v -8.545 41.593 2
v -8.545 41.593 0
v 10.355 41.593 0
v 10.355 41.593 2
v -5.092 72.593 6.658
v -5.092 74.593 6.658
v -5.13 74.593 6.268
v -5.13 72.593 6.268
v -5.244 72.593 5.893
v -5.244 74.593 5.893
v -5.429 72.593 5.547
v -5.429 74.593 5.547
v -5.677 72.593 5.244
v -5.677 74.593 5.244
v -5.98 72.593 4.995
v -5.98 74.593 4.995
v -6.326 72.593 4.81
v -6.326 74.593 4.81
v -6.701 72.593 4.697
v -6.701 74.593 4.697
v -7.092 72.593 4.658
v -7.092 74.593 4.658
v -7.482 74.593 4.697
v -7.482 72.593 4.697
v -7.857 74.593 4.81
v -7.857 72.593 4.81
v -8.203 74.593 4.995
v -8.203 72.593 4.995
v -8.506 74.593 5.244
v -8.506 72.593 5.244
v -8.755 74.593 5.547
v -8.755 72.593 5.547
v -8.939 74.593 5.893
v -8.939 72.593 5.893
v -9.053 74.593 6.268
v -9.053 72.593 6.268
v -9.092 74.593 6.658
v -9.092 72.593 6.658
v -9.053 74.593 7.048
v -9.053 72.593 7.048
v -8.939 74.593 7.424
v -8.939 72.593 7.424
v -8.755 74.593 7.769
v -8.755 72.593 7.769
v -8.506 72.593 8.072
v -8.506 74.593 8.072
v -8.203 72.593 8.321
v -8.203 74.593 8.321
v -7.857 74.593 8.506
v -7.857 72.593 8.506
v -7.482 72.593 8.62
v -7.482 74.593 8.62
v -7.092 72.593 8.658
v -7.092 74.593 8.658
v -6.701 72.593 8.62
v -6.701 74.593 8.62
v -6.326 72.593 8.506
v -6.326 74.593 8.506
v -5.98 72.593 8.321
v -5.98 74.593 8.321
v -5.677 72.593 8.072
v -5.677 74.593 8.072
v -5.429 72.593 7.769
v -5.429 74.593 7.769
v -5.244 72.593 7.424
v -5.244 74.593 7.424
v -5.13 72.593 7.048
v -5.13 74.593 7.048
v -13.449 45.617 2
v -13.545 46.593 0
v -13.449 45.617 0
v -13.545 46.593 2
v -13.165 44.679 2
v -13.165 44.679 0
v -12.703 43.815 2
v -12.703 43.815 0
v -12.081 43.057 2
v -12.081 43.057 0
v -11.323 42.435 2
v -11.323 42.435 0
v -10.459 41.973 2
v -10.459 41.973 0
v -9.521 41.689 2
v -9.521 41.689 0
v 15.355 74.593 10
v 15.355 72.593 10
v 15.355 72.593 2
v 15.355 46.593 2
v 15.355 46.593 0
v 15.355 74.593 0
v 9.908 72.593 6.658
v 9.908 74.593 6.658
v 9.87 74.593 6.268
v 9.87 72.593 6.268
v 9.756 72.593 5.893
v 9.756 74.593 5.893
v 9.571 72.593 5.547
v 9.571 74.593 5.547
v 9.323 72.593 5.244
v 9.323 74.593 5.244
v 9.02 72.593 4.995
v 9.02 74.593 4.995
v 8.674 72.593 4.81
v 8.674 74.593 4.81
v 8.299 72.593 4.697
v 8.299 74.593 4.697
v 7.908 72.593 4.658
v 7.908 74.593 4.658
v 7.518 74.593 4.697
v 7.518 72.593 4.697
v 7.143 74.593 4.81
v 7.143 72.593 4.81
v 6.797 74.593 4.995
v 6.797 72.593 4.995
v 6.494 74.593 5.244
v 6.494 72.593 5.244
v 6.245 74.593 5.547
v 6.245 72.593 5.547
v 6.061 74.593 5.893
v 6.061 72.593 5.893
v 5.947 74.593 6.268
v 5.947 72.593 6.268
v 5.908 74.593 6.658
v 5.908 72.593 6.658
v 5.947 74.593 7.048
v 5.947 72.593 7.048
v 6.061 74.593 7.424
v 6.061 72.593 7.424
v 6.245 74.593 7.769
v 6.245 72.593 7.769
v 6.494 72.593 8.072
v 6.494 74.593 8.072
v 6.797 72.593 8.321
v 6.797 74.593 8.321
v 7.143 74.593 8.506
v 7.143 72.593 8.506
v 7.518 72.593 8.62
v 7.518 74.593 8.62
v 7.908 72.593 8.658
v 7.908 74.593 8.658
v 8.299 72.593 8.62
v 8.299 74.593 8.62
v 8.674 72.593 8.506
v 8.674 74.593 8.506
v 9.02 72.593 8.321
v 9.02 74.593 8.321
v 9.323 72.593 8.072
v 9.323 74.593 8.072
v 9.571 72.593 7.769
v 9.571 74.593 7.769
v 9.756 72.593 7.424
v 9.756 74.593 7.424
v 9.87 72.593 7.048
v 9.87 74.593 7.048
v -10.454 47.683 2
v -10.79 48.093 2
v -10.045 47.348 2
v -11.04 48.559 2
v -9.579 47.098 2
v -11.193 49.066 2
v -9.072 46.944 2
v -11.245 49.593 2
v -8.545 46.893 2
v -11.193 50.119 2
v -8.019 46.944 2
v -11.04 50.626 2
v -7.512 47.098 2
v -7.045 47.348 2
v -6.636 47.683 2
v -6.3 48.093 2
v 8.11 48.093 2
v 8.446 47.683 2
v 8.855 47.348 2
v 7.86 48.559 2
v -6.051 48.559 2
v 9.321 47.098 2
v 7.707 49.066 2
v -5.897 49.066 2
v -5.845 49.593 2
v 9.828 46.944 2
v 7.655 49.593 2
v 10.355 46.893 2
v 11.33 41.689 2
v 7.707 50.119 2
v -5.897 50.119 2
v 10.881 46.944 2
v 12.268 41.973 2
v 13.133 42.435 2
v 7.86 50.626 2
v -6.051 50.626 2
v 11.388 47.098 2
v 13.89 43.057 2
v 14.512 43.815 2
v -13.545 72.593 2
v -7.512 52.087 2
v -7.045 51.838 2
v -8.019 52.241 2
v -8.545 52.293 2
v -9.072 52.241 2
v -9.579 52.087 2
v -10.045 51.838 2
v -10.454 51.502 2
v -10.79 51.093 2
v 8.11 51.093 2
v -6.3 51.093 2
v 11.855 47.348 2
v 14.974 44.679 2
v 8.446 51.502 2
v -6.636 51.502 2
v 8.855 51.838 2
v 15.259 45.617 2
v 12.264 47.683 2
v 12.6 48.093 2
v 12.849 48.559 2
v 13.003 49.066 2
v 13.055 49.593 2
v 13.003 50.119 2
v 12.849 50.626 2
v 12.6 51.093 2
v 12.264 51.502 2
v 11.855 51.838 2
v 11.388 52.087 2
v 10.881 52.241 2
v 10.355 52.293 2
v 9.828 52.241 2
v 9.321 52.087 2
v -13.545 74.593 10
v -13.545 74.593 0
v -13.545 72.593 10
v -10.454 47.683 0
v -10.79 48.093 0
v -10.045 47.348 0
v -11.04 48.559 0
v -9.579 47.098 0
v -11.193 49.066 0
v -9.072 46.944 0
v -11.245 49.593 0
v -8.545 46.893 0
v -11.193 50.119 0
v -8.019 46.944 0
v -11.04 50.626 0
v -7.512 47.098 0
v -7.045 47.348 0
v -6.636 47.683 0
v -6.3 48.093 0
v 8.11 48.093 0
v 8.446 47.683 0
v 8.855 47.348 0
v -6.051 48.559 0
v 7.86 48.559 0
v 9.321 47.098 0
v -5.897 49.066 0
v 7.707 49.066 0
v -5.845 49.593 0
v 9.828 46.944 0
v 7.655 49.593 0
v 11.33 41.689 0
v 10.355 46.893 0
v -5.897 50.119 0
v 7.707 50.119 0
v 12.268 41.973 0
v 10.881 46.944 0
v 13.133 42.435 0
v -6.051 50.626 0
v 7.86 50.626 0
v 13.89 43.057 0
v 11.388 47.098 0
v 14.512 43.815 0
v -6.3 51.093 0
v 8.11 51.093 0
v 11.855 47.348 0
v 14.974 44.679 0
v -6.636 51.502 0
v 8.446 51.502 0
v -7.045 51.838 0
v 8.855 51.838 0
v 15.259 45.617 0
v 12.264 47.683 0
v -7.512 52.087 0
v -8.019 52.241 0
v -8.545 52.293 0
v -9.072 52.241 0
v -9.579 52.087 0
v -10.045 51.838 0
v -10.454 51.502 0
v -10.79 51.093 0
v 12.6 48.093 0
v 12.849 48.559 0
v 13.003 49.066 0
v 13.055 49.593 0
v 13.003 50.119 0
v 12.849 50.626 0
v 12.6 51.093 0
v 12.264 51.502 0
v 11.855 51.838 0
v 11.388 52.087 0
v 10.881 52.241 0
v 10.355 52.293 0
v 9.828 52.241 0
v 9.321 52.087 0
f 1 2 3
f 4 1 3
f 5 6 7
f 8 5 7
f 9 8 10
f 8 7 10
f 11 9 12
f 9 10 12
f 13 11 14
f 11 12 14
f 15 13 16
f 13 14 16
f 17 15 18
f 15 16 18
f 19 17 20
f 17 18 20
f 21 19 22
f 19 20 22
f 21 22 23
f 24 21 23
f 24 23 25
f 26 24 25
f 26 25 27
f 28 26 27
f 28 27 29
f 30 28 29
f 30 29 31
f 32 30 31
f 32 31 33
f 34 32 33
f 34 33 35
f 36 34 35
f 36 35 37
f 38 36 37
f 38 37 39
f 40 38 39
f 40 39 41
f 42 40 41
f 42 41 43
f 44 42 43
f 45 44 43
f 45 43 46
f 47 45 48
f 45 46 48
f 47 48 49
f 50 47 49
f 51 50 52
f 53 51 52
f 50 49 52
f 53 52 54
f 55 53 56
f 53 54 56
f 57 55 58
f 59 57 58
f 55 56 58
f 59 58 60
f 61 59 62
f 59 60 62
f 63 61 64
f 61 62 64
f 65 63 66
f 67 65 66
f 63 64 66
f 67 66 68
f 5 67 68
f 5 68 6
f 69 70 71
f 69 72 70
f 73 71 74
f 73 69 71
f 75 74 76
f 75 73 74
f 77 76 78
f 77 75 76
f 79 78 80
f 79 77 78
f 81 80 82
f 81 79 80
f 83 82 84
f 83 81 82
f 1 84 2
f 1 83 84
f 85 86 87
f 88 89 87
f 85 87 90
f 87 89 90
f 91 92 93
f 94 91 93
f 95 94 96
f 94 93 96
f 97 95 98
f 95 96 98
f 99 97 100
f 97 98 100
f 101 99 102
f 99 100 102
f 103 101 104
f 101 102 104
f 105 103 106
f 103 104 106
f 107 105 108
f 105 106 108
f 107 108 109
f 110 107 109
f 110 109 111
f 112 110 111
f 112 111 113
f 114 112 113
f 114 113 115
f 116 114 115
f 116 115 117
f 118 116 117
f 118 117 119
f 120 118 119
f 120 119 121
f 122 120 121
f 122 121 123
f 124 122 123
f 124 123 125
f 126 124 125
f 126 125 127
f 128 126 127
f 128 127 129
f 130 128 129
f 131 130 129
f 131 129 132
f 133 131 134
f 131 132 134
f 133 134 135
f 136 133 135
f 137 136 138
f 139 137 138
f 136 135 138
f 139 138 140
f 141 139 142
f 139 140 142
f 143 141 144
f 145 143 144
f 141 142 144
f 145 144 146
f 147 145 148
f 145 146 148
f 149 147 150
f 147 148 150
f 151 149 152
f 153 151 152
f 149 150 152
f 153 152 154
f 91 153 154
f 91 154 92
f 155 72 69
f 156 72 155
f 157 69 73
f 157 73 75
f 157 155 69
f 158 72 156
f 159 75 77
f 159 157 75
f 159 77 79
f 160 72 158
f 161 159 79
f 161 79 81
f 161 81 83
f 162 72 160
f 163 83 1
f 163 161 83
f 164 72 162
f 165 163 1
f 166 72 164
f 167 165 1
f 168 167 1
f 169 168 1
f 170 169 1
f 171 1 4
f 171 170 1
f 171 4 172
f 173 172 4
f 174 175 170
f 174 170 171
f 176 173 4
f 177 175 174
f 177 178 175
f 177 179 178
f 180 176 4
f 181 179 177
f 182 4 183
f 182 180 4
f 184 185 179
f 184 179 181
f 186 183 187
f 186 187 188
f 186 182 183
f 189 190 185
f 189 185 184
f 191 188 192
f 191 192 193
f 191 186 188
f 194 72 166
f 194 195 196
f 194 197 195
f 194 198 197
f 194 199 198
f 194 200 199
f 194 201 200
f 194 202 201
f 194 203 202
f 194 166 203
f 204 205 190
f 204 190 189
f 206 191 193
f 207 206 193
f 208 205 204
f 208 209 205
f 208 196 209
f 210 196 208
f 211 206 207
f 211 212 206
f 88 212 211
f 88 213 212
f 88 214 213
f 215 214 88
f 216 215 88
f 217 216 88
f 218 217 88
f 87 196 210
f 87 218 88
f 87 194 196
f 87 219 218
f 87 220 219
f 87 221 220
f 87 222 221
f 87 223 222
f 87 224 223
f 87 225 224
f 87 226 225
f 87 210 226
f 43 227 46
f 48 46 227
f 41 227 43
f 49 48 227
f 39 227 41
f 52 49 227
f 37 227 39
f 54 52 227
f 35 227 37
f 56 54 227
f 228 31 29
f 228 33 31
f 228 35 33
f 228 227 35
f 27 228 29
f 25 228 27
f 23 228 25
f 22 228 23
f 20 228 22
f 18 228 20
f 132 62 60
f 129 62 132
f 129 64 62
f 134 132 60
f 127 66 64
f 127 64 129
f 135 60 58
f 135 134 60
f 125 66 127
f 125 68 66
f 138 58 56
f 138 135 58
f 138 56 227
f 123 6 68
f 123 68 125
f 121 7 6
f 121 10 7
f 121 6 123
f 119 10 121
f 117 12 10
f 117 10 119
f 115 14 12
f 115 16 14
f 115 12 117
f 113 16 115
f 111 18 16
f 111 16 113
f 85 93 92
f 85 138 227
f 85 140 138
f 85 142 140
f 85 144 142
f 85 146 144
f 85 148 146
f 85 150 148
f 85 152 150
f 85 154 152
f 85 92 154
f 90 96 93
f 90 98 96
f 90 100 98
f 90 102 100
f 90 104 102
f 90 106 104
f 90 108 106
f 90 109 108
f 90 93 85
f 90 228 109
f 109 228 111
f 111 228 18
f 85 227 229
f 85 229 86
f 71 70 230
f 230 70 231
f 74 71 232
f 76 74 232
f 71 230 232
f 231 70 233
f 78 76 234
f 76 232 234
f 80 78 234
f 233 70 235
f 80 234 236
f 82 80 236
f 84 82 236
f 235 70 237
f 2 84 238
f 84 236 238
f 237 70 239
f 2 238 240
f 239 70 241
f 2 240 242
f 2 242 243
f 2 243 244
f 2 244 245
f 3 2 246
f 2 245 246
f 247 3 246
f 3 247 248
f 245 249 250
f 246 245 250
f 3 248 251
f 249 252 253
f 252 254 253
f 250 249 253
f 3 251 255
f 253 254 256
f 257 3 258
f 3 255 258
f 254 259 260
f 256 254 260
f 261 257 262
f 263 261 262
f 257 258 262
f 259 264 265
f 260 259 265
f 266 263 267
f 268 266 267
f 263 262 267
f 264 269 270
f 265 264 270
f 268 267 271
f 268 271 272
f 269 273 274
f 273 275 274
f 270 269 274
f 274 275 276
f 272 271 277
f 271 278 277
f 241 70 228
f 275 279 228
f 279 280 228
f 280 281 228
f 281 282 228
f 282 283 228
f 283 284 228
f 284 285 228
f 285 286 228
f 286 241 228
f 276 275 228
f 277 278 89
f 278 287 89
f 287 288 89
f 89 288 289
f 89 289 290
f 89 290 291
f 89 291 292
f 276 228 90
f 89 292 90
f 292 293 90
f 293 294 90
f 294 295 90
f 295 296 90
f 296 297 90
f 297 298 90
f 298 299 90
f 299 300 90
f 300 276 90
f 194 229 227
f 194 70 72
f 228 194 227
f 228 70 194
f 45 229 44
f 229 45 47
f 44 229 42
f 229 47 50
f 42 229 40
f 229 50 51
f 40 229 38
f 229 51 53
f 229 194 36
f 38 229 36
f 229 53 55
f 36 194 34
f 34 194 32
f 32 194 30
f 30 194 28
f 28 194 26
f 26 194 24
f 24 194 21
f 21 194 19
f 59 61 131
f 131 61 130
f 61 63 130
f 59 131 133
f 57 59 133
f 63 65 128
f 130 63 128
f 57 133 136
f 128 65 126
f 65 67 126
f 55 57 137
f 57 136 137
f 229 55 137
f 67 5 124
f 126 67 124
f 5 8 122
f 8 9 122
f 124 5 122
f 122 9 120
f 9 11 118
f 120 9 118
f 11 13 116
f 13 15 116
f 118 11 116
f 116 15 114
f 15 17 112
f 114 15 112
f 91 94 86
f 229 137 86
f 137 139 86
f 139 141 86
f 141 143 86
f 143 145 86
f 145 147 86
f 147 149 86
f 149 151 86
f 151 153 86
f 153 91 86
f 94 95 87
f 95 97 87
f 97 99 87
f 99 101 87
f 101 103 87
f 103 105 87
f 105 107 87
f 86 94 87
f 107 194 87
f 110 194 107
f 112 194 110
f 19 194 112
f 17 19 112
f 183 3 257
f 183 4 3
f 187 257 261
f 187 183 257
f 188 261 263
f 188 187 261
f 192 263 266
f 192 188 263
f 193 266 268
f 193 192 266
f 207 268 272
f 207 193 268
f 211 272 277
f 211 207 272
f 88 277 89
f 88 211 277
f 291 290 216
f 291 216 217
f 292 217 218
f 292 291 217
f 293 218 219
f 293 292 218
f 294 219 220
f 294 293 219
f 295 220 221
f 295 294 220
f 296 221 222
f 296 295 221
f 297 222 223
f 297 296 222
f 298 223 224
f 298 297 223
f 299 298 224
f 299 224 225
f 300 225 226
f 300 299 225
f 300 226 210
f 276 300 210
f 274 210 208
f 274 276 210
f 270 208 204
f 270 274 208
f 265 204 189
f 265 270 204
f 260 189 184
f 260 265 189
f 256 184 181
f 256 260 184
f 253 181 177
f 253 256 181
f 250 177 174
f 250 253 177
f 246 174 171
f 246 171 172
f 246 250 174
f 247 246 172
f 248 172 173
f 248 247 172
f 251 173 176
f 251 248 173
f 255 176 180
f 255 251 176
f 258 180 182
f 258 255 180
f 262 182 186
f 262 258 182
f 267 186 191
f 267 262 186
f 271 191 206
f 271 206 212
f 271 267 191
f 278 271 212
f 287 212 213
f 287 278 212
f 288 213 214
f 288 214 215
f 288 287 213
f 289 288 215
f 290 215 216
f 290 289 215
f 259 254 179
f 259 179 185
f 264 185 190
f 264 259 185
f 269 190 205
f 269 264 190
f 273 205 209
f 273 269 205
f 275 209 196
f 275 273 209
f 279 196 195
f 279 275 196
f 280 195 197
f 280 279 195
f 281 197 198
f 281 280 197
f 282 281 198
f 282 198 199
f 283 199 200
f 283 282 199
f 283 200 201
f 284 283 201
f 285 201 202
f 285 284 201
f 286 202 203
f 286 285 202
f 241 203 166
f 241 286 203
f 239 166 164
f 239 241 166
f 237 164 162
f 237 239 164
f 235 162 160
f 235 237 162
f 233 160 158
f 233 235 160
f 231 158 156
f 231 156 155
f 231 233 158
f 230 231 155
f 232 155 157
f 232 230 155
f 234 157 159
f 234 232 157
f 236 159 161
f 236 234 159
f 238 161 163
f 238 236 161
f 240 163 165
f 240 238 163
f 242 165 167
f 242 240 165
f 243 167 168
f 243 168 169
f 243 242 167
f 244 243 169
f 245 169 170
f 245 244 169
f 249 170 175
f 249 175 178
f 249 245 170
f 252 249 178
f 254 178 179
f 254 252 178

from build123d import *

# Parameters (mm, degrees)
SKETCH1_W           = 28.9
SKETCH1_H           = 33
SKETCH1_R           = 2.7
BOSS_EXTRUDE1_DEPTH = 2
FILLET1_R           = 5
SKETCH3_W           = 28.9
SKETCH3_H           = 2
BOSS_EXTRUDE3_DEPTH = 8
SKETCH5_R           = 2
CUT_EXTRUDE2_DEPTH  = 10


with BuildPart() as part:
    # Sketch1 → Boss-Extrude1 (new body)
    with BuildSketch(Plane.XY):
        with Locations((0.904740234, 58.092544957)):
            Rectangle(SKETCH1_W, SKETCH1_H)
        with Locations((-8.545259766, 49.592544957)):
            Circle(SKETCH1_R, mode=Mode.SUBTRACT)
        with Locations((10.354740234, 49.592544957)):
            Circle(SKETCH1_R, mode=Mode.SUBTRACT)
    extrude(amount=BOSS_EXTRUDE1_DEPTH)

    # Fillet1
    fillet1_edges = [part.edges().sort_by_distance(p)[0] for p in [
        (15.354740234, 41.592544957, 1),
        (-13.545259766, 41.592544957, 1),
    ]]
    fillet(fillet1_edges, radius=FILLET1_R)

    # Sketch3 → Boss-Extrude3 (add)
    with BuildSketch(Plane.XY.offset(2)):
        with Locations((0.904740234, 73.592544957)):
            Rectangle(SKETCH3_W, SKETCH3_H)
    extrude(amount=BOSS_EXTRUDE3_DEPTH)

    # Sketch5 → Cut-Extrude2 (cut)
    with BuildSketch(Plane(origin=(0, 74.592544957, 0), x_dir=(1, 0, 0), z_dir=(0, 1, 0))):
        with Locations((-7.091615714, -6.658195947)):
            Circle(SKETCH5_R)
        with Locations((7.908384286, -6.658195947)):
            Circle(SKETCH5_R)
    extrude(amount=-CUT_EXTRUDE2_DEPTH, mode=Mode.SUBTRACT)


solid = part.part
